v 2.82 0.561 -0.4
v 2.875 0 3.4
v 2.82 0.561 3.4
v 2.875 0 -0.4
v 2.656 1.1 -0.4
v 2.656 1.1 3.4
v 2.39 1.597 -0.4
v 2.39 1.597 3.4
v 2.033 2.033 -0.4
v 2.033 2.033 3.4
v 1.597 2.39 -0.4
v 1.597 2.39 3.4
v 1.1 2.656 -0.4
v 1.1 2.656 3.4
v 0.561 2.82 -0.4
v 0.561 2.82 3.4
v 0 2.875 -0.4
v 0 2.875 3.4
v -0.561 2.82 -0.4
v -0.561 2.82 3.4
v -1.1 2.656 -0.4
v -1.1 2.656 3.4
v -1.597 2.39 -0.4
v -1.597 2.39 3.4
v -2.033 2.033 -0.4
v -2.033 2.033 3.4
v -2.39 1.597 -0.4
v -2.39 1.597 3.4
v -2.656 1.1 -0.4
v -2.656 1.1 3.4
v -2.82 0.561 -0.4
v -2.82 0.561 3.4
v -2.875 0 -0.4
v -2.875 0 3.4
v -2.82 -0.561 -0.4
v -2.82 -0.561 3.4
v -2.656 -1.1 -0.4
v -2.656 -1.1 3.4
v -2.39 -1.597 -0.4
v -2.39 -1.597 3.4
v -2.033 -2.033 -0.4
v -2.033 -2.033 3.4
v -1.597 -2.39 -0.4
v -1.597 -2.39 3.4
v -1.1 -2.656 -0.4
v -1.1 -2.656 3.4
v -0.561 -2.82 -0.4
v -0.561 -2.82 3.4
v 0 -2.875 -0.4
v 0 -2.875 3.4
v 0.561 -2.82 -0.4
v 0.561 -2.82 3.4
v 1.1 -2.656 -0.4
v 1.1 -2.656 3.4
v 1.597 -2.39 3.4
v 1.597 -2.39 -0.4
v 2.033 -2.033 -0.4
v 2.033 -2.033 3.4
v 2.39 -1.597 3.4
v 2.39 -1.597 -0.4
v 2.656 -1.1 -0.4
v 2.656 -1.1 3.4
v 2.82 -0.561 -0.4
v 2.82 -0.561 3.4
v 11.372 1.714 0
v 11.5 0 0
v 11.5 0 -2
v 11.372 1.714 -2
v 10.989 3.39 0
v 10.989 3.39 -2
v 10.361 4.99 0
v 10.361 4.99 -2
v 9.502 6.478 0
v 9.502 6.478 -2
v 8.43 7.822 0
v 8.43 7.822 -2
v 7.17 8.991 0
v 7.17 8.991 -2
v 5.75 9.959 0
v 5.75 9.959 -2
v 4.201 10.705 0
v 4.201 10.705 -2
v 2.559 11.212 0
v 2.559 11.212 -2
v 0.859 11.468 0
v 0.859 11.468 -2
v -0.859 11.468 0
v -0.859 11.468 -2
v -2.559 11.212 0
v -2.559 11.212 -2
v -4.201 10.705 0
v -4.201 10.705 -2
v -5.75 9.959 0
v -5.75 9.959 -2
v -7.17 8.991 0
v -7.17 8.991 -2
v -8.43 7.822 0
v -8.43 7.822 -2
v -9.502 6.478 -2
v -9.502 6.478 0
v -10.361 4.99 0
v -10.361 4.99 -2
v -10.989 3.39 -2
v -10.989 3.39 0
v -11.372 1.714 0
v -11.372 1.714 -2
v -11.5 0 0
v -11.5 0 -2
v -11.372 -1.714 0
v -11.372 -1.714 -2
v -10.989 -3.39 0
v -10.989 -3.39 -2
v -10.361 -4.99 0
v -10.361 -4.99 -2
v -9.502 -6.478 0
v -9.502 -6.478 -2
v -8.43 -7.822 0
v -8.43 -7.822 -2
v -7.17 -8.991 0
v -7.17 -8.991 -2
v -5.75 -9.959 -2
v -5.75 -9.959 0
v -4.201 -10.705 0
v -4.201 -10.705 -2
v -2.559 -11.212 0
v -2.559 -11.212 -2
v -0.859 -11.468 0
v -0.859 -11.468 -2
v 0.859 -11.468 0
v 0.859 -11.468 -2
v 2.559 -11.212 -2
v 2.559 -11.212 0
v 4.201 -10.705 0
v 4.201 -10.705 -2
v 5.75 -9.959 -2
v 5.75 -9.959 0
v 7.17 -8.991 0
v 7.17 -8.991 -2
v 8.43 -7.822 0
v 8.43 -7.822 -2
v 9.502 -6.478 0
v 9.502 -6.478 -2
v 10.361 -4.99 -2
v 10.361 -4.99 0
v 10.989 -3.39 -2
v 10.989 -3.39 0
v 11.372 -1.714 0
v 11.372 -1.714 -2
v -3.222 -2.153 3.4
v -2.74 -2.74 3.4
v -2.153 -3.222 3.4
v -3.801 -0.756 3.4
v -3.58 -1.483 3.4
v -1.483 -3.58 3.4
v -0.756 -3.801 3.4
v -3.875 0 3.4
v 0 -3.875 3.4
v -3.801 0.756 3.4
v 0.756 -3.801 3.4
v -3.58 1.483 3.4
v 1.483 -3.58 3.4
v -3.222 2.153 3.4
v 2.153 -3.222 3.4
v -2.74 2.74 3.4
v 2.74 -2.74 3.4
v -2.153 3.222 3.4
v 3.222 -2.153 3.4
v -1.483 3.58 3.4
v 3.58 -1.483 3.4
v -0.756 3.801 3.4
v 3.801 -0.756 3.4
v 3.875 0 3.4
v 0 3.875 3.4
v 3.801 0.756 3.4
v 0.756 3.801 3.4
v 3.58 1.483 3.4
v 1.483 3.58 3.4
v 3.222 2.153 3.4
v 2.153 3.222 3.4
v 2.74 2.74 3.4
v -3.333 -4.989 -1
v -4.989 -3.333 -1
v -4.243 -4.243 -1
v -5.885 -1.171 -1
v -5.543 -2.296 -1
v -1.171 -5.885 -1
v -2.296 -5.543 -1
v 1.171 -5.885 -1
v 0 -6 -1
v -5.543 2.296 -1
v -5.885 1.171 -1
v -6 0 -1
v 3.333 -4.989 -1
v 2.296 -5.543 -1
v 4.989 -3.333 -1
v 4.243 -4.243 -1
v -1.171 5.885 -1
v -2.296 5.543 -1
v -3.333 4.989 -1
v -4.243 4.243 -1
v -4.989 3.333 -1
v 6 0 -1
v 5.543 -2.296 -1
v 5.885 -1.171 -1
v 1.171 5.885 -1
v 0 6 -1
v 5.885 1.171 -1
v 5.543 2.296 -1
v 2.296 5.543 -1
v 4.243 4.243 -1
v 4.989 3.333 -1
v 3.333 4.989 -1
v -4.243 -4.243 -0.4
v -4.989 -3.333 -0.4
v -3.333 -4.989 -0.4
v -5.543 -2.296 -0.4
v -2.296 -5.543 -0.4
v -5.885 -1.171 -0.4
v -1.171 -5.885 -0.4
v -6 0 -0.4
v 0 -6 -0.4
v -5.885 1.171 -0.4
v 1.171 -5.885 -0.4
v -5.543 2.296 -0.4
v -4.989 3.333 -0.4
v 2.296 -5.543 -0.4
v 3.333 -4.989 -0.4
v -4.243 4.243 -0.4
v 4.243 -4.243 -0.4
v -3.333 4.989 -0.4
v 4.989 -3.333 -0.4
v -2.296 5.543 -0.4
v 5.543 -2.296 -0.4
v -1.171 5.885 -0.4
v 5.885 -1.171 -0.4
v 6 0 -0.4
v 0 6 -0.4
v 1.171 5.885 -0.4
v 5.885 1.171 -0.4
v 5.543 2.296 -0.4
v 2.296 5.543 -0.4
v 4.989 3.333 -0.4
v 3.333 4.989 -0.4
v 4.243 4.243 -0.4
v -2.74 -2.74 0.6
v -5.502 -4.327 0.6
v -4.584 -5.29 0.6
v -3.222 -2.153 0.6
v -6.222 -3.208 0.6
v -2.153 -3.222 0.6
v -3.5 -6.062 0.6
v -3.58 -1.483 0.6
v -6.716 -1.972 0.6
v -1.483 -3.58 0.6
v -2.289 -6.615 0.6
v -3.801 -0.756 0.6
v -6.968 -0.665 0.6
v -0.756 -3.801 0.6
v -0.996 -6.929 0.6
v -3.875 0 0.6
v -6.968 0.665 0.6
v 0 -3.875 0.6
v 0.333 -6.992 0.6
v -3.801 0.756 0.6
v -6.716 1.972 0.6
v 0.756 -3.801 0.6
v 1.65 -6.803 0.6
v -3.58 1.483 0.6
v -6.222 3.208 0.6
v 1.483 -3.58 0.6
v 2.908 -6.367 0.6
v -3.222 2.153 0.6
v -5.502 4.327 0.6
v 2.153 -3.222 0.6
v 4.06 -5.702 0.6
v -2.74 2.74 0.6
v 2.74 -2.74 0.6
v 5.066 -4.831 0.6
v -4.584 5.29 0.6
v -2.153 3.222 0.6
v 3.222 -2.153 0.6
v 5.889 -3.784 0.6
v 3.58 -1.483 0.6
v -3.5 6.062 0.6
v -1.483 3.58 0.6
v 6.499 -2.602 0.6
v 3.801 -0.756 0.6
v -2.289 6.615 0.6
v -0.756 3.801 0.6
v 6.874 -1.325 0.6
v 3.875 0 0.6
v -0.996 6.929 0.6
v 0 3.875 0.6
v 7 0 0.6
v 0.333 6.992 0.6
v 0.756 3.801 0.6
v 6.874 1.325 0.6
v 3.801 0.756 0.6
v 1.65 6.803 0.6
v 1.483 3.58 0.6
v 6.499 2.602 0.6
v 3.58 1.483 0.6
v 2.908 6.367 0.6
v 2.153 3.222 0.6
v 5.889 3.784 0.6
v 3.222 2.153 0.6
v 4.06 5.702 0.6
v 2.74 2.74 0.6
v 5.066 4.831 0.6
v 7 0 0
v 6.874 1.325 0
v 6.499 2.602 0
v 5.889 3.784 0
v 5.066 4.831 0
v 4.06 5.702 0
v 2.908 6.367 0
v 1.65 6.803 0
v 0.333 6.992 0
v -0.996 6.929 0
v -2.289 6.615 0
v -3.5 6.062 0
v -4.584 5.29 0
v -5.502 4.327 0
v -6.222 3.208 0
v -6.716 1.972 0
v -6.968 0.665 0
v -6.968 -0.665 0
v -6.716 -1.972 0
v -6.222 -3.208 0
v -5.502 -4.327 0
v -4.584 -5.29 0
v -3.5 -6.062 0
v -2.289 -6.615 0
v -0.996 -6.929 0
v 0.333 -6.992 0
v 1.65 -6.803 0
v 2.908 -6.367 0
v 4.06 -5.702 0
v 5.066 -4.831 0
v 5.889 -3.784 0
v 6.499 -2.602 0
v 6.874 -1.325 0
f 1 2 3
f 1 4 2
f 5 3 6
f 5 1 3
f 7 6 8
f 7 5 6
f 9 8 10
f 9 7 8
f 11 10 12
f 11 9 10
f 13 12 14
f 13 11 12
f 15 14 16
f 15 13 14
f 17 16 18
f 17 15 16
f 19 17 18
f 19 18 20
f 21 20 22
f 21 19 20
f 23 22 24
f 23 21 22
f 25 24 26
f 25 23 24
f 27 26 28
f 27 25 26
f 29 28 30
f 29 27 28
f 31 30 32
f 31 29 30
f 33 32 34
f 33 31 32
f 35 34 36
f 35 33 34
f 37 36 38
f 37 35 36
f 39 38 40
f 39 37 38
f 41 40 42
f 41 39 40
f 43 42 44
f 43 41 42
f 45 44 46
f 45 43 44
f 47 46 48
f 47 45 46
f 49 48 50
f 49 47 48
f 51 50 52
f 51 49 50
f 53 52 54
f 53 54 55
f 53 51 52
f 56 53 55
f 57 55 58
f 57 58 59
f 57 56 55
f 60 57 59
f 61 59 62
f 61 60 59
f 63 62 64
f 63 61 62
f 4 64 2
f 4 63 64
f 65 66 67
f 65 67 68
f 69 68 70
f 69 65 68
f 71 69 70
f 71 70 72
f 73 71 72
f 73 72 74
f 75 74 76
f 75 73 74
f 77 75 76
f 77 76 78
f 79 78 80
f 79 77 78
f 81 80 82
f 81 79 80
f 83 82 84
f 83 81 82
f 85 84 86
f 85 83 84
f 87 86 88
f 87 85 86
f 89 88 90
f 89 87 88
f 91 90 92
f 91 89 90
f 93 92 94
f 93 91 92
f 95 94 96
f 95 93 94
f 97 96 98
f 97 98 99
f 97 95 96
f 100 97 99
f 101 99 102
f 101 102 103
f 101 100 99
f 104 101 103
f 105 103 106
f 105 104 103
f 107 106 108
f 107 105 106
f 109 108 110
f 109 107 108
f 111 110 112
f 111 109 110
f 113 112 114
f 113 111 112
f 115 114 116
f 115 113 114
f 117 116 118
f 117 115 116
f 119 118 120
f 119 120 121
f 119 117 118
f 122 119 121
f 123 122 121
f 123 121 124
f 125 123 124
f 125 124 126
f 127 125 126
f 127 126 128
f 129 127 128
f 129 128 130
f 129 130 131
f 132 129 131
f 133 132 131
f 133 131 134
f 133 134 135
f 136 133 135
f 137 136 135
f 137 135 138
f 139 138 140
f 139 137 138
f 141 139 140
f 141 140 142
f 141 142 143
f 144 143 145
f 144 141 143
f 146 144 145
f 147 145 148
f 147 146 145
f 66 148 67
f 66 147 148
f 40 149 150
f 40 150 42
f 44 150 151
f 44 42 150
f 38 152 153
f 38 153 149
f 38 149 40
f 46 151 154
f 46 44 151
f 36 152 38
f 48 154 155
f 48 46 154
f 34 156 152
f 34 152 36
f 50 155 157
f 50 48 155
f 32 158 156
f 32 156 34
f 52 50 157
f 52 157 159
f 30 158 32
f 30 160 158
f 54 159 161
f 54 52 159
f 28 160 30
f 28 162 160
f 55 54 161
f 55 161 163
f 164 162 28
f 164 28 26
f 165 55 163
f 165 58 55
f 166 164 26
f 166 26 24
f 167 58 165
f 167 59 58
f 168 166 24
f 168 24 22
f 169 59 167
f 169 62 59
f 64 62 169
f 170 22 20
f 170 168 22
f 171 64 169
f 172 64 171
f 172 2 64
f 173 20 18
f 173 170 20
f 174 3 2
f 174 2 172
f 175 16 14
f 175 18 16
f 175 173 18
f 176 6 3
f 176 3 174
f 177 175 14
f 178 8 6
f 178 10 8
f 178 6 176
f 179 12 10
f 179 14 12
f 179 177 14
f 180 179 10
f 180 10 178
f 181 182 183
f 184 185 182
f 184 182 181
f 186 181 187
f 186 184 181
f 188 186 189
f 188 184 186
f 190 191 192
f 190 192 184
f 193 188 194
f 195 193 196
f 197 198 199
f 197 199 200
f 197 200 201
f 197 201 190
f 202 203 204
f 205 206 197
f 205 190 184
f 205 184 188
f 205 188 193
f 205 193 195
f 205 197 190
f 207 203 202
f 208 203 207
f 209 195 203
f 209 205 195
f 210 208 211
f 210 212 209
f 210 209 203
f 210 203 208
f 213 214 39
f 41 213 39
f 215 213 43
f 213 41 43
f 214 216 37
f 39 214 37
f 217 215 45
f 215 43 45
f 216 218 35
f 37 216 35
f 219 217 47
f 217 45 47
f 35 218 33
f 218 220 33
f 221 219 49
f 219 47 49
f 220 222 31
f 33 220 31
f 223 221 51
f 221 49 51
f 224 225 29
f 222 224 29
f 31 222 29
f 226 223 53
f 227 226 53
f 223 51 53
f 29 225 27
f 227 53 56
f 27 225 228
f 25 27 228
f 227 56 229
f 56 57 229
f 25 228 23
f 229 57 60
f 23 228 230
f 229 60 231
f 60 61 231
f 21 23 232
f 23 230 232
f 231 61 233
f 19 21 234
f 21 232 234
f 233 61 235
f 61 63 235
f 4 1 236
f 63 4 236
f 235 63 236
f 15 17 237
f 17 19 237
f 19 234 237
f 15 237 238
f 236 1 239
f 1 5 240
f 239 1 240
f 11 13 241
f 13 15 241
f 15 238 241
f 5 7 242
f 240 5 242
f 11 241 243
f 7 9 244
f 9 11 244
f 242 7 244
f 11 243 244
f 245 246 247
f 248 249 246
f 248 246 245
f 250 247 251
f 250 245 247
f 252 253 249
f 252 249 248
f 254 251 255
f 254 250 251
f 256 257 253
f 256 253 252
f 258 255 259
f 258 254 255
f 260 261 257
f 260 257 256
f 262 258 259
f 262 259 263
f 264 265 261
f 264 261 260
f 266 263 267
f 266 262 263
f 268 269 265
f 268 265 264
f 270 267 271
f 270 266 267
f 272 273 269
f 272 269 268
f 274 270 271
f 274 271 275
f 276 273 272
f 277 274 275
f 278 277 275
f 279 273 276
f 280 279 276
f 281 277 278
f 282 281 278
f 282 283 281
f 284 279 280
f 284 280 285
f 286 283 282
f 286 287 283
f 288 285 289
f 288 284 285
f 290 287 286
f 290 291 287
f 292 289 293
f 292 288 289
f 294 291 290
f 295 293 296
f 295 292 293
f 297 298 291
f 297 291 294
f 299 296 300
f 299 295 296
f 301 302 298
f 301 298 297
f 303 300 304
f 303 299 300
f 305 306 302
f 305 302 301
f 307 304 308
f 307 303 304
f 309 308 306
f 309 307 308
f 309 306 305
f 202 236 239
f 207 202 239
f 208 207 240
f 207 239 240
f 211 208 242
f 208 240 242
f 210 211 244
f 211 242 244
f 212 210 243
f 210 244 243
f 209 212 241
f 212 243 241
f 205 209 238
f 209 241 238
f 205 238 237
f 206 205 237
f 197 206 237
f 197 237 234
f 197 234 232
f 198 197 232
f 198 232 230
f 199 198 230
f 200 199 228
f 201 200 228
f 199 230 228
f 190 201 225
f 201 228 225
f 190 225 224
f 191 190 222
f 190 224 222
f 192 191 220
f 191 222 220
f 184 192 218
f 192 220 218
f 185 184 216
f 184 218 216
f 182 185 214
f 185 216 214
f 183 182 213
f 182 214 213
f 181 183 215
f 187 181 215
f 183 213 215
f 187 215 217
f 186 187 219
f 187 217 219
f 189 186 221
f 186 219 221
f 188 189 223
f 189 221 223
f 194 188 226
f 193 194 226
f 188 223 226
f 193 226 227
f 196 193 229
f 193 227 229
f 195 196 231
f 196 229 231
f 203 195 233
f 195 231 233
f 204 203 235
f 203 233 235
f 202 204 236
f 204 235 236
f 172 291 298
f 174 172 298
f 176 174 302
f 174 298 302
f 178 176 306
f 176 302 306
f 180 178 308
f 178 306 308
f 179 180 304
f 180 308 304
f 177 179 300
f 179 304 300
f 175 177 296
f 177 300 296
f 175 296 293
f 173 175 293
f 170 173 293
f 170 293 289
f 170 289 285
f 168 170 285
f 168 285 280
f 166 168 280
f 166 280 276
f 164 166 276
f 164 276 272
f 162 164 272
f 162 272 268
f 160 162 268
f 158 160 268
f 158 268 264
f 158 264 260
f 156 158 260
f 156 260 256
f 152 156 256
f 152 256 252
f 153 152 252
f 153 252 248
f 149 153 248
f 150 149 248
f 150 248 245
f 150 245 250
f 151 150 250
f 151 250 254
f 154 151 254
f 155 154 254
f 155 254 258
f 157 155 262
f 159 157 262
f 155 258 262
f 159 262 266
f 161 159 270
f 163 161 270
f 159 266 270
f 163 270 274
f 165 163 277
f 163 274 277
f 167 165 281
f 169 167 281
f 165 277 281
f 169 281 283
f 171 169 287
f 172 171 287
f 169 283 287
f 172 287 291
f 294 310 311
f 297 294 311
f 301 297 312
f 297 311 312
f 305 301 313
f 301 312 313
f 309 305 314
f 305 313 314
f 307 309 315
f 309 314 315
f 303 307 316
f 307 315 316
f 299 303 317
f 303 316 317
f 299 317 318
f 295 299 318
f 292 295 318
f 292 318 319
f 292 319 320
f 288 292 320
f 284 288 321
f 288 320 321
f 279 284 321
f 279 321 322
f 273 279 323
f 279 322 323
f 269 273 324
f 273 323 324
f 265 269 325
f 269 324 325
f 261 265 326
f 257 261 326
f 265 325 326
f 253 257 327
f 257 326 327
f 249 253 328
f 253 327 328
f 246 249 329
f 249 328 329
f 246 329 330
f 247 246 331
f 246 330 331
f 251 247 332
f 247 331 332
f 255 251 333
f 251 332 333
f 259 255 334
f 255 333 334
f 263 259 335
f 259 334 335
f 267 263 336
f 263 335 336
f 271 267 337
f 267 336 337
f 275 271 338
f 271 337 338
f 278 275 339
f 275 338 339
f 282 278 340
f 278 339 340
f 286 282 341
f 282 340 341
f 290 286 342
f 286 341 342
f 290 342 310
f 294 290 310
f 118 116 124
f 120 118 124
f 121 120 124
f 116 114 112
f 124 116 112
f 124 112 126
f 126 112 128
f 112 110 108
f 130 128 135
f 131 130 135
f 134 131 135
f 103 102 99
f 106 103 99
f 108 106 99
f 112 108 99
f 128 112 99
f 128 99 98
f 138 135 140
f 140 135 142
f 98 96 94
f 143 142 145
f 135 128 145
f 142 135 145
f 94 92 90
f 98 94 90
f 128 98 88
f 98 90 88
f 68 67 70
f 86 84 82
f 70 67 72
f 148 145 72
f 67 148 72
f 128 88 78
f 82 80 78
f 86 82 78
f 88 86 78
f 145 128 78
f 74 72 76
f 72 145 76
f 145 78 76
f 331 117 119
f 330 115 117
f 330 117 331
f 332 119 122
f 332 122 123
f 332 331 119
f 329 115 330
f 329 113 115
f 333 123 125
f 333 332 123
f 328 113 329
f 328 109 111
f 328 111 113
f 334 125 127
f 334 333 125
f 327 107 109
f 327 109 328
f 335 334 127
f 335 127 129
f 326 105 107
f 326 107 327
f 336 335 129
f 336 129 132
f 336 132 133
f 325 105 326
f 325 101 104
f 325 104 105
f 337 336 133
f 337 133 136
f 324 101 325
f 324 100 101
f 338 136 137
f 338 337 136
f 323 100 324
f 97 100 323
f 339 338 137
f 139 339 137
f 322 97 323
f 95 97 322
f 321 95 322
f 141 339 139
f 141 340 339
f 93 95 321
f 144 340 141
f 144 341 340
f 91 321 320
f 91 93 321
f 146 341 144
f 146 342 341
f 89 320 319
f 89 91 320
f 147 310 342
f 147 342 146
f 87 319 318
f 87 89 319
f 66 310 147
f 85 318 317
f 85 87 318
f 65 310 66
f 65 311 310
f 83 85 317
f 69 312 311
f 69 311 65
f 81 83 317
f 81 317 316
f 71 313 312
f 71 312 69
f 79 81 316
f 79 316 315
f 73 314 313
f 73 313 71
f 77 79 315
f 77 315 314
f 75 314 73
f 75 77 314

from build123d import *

# Parameters (mm, degrees)
F0_R     = 3.875
F1_DEPTH = 3.4
F0_R_2   = 7
F2_DEPTH = 0.6
F0_R_3   = 11.5
F3_DEPTH = 2
F4_T     = 1


# Not quite as in the source:
# - a shell that OpenCascade refuses in one call is made with other operations: the cavity is built on its own and cut out


with BuildPart() as f1:
    # F0 (on Top) → F1 (new body)
    with BuildSketch(Plane.XY):
        Circle(F0_R)
    extrude(amount=F1_DEPTH)

    # F0 (on Top) → F2 (join)
    with BuildSketch(Plane.XY):
        Circle(F0_R_2)
        Circle(F0_R, mode=Mode.SUBTRACT)
    extrude(amount=F2_DEPTH)

    # F0 (on Top) → F3 (join)
    with BuildSketch(Plane.XY):
        Circle(F0_R_3)
        Circle(F0_R_2, mode=Mode.SUBTRACT)
        Circle(F0_R_2)
        Circle(F0_R, mode=Mode.SUBTRACT)
        Circle(F0_R)
    extrude(amount=-F3_DEPTH)

    # F4: shell of thickness 1, made by hand


with BuildPart() as f4_core1:
    # F4_t2: copy of F1
    add(f1.part)

    # the walls: a layer under each face that stays
    f4_faces = [f4_core1.faces().sort_by_distance(p)[0] for p in [
        (-11.5, 0, -1),
        (-7.6666666667, -7.6666666667, 0),
        (0, 0, -2),
        (-7, 0, 0.3),
        (-4.6666666667, -4.6666666667, 0.6),
        (-3.875, 0, 2),
    ]]
    thicken(f4_faces, amount=-F4_T, mode=Mode.SUBTRACT)

    # F4_s3 → F4_t4 (revolve, cut)
    with BuildSketch(Plane.XZ):
        Polygon((7.01, 0.01), (7, -1), (6, -1), (6, 0), align=None)
    revolve(axis=Axis((0, 0, 0), (0, 0, 1)), mode=Mode.SUBTRACT)

    # F4_s5 → F4_t6 (revolve, cut)
    with BuildSketch(Plane.XZ):
        Polygon((3.885, 0.61), (3.875, -0.4), (2.875, -0.4), (2.875, 0.6), align=None)
    revolve(axis=Axis((0, 0, 0.6), (0, 0, 1)), mode=Mode.SUBTRACT)


with BuildPart() as f1_1:
    add(f1.part)

    # what is left inside the walls is the cavity
    f4_cavity = [f4_core1.part.solids().sort_by_distance(p)[0] for p in [
        (0, -2, -0.99),
    ]]
    add(f4_cavity, mode=Mode.SUBTRACT)


solid = f1_1.part
